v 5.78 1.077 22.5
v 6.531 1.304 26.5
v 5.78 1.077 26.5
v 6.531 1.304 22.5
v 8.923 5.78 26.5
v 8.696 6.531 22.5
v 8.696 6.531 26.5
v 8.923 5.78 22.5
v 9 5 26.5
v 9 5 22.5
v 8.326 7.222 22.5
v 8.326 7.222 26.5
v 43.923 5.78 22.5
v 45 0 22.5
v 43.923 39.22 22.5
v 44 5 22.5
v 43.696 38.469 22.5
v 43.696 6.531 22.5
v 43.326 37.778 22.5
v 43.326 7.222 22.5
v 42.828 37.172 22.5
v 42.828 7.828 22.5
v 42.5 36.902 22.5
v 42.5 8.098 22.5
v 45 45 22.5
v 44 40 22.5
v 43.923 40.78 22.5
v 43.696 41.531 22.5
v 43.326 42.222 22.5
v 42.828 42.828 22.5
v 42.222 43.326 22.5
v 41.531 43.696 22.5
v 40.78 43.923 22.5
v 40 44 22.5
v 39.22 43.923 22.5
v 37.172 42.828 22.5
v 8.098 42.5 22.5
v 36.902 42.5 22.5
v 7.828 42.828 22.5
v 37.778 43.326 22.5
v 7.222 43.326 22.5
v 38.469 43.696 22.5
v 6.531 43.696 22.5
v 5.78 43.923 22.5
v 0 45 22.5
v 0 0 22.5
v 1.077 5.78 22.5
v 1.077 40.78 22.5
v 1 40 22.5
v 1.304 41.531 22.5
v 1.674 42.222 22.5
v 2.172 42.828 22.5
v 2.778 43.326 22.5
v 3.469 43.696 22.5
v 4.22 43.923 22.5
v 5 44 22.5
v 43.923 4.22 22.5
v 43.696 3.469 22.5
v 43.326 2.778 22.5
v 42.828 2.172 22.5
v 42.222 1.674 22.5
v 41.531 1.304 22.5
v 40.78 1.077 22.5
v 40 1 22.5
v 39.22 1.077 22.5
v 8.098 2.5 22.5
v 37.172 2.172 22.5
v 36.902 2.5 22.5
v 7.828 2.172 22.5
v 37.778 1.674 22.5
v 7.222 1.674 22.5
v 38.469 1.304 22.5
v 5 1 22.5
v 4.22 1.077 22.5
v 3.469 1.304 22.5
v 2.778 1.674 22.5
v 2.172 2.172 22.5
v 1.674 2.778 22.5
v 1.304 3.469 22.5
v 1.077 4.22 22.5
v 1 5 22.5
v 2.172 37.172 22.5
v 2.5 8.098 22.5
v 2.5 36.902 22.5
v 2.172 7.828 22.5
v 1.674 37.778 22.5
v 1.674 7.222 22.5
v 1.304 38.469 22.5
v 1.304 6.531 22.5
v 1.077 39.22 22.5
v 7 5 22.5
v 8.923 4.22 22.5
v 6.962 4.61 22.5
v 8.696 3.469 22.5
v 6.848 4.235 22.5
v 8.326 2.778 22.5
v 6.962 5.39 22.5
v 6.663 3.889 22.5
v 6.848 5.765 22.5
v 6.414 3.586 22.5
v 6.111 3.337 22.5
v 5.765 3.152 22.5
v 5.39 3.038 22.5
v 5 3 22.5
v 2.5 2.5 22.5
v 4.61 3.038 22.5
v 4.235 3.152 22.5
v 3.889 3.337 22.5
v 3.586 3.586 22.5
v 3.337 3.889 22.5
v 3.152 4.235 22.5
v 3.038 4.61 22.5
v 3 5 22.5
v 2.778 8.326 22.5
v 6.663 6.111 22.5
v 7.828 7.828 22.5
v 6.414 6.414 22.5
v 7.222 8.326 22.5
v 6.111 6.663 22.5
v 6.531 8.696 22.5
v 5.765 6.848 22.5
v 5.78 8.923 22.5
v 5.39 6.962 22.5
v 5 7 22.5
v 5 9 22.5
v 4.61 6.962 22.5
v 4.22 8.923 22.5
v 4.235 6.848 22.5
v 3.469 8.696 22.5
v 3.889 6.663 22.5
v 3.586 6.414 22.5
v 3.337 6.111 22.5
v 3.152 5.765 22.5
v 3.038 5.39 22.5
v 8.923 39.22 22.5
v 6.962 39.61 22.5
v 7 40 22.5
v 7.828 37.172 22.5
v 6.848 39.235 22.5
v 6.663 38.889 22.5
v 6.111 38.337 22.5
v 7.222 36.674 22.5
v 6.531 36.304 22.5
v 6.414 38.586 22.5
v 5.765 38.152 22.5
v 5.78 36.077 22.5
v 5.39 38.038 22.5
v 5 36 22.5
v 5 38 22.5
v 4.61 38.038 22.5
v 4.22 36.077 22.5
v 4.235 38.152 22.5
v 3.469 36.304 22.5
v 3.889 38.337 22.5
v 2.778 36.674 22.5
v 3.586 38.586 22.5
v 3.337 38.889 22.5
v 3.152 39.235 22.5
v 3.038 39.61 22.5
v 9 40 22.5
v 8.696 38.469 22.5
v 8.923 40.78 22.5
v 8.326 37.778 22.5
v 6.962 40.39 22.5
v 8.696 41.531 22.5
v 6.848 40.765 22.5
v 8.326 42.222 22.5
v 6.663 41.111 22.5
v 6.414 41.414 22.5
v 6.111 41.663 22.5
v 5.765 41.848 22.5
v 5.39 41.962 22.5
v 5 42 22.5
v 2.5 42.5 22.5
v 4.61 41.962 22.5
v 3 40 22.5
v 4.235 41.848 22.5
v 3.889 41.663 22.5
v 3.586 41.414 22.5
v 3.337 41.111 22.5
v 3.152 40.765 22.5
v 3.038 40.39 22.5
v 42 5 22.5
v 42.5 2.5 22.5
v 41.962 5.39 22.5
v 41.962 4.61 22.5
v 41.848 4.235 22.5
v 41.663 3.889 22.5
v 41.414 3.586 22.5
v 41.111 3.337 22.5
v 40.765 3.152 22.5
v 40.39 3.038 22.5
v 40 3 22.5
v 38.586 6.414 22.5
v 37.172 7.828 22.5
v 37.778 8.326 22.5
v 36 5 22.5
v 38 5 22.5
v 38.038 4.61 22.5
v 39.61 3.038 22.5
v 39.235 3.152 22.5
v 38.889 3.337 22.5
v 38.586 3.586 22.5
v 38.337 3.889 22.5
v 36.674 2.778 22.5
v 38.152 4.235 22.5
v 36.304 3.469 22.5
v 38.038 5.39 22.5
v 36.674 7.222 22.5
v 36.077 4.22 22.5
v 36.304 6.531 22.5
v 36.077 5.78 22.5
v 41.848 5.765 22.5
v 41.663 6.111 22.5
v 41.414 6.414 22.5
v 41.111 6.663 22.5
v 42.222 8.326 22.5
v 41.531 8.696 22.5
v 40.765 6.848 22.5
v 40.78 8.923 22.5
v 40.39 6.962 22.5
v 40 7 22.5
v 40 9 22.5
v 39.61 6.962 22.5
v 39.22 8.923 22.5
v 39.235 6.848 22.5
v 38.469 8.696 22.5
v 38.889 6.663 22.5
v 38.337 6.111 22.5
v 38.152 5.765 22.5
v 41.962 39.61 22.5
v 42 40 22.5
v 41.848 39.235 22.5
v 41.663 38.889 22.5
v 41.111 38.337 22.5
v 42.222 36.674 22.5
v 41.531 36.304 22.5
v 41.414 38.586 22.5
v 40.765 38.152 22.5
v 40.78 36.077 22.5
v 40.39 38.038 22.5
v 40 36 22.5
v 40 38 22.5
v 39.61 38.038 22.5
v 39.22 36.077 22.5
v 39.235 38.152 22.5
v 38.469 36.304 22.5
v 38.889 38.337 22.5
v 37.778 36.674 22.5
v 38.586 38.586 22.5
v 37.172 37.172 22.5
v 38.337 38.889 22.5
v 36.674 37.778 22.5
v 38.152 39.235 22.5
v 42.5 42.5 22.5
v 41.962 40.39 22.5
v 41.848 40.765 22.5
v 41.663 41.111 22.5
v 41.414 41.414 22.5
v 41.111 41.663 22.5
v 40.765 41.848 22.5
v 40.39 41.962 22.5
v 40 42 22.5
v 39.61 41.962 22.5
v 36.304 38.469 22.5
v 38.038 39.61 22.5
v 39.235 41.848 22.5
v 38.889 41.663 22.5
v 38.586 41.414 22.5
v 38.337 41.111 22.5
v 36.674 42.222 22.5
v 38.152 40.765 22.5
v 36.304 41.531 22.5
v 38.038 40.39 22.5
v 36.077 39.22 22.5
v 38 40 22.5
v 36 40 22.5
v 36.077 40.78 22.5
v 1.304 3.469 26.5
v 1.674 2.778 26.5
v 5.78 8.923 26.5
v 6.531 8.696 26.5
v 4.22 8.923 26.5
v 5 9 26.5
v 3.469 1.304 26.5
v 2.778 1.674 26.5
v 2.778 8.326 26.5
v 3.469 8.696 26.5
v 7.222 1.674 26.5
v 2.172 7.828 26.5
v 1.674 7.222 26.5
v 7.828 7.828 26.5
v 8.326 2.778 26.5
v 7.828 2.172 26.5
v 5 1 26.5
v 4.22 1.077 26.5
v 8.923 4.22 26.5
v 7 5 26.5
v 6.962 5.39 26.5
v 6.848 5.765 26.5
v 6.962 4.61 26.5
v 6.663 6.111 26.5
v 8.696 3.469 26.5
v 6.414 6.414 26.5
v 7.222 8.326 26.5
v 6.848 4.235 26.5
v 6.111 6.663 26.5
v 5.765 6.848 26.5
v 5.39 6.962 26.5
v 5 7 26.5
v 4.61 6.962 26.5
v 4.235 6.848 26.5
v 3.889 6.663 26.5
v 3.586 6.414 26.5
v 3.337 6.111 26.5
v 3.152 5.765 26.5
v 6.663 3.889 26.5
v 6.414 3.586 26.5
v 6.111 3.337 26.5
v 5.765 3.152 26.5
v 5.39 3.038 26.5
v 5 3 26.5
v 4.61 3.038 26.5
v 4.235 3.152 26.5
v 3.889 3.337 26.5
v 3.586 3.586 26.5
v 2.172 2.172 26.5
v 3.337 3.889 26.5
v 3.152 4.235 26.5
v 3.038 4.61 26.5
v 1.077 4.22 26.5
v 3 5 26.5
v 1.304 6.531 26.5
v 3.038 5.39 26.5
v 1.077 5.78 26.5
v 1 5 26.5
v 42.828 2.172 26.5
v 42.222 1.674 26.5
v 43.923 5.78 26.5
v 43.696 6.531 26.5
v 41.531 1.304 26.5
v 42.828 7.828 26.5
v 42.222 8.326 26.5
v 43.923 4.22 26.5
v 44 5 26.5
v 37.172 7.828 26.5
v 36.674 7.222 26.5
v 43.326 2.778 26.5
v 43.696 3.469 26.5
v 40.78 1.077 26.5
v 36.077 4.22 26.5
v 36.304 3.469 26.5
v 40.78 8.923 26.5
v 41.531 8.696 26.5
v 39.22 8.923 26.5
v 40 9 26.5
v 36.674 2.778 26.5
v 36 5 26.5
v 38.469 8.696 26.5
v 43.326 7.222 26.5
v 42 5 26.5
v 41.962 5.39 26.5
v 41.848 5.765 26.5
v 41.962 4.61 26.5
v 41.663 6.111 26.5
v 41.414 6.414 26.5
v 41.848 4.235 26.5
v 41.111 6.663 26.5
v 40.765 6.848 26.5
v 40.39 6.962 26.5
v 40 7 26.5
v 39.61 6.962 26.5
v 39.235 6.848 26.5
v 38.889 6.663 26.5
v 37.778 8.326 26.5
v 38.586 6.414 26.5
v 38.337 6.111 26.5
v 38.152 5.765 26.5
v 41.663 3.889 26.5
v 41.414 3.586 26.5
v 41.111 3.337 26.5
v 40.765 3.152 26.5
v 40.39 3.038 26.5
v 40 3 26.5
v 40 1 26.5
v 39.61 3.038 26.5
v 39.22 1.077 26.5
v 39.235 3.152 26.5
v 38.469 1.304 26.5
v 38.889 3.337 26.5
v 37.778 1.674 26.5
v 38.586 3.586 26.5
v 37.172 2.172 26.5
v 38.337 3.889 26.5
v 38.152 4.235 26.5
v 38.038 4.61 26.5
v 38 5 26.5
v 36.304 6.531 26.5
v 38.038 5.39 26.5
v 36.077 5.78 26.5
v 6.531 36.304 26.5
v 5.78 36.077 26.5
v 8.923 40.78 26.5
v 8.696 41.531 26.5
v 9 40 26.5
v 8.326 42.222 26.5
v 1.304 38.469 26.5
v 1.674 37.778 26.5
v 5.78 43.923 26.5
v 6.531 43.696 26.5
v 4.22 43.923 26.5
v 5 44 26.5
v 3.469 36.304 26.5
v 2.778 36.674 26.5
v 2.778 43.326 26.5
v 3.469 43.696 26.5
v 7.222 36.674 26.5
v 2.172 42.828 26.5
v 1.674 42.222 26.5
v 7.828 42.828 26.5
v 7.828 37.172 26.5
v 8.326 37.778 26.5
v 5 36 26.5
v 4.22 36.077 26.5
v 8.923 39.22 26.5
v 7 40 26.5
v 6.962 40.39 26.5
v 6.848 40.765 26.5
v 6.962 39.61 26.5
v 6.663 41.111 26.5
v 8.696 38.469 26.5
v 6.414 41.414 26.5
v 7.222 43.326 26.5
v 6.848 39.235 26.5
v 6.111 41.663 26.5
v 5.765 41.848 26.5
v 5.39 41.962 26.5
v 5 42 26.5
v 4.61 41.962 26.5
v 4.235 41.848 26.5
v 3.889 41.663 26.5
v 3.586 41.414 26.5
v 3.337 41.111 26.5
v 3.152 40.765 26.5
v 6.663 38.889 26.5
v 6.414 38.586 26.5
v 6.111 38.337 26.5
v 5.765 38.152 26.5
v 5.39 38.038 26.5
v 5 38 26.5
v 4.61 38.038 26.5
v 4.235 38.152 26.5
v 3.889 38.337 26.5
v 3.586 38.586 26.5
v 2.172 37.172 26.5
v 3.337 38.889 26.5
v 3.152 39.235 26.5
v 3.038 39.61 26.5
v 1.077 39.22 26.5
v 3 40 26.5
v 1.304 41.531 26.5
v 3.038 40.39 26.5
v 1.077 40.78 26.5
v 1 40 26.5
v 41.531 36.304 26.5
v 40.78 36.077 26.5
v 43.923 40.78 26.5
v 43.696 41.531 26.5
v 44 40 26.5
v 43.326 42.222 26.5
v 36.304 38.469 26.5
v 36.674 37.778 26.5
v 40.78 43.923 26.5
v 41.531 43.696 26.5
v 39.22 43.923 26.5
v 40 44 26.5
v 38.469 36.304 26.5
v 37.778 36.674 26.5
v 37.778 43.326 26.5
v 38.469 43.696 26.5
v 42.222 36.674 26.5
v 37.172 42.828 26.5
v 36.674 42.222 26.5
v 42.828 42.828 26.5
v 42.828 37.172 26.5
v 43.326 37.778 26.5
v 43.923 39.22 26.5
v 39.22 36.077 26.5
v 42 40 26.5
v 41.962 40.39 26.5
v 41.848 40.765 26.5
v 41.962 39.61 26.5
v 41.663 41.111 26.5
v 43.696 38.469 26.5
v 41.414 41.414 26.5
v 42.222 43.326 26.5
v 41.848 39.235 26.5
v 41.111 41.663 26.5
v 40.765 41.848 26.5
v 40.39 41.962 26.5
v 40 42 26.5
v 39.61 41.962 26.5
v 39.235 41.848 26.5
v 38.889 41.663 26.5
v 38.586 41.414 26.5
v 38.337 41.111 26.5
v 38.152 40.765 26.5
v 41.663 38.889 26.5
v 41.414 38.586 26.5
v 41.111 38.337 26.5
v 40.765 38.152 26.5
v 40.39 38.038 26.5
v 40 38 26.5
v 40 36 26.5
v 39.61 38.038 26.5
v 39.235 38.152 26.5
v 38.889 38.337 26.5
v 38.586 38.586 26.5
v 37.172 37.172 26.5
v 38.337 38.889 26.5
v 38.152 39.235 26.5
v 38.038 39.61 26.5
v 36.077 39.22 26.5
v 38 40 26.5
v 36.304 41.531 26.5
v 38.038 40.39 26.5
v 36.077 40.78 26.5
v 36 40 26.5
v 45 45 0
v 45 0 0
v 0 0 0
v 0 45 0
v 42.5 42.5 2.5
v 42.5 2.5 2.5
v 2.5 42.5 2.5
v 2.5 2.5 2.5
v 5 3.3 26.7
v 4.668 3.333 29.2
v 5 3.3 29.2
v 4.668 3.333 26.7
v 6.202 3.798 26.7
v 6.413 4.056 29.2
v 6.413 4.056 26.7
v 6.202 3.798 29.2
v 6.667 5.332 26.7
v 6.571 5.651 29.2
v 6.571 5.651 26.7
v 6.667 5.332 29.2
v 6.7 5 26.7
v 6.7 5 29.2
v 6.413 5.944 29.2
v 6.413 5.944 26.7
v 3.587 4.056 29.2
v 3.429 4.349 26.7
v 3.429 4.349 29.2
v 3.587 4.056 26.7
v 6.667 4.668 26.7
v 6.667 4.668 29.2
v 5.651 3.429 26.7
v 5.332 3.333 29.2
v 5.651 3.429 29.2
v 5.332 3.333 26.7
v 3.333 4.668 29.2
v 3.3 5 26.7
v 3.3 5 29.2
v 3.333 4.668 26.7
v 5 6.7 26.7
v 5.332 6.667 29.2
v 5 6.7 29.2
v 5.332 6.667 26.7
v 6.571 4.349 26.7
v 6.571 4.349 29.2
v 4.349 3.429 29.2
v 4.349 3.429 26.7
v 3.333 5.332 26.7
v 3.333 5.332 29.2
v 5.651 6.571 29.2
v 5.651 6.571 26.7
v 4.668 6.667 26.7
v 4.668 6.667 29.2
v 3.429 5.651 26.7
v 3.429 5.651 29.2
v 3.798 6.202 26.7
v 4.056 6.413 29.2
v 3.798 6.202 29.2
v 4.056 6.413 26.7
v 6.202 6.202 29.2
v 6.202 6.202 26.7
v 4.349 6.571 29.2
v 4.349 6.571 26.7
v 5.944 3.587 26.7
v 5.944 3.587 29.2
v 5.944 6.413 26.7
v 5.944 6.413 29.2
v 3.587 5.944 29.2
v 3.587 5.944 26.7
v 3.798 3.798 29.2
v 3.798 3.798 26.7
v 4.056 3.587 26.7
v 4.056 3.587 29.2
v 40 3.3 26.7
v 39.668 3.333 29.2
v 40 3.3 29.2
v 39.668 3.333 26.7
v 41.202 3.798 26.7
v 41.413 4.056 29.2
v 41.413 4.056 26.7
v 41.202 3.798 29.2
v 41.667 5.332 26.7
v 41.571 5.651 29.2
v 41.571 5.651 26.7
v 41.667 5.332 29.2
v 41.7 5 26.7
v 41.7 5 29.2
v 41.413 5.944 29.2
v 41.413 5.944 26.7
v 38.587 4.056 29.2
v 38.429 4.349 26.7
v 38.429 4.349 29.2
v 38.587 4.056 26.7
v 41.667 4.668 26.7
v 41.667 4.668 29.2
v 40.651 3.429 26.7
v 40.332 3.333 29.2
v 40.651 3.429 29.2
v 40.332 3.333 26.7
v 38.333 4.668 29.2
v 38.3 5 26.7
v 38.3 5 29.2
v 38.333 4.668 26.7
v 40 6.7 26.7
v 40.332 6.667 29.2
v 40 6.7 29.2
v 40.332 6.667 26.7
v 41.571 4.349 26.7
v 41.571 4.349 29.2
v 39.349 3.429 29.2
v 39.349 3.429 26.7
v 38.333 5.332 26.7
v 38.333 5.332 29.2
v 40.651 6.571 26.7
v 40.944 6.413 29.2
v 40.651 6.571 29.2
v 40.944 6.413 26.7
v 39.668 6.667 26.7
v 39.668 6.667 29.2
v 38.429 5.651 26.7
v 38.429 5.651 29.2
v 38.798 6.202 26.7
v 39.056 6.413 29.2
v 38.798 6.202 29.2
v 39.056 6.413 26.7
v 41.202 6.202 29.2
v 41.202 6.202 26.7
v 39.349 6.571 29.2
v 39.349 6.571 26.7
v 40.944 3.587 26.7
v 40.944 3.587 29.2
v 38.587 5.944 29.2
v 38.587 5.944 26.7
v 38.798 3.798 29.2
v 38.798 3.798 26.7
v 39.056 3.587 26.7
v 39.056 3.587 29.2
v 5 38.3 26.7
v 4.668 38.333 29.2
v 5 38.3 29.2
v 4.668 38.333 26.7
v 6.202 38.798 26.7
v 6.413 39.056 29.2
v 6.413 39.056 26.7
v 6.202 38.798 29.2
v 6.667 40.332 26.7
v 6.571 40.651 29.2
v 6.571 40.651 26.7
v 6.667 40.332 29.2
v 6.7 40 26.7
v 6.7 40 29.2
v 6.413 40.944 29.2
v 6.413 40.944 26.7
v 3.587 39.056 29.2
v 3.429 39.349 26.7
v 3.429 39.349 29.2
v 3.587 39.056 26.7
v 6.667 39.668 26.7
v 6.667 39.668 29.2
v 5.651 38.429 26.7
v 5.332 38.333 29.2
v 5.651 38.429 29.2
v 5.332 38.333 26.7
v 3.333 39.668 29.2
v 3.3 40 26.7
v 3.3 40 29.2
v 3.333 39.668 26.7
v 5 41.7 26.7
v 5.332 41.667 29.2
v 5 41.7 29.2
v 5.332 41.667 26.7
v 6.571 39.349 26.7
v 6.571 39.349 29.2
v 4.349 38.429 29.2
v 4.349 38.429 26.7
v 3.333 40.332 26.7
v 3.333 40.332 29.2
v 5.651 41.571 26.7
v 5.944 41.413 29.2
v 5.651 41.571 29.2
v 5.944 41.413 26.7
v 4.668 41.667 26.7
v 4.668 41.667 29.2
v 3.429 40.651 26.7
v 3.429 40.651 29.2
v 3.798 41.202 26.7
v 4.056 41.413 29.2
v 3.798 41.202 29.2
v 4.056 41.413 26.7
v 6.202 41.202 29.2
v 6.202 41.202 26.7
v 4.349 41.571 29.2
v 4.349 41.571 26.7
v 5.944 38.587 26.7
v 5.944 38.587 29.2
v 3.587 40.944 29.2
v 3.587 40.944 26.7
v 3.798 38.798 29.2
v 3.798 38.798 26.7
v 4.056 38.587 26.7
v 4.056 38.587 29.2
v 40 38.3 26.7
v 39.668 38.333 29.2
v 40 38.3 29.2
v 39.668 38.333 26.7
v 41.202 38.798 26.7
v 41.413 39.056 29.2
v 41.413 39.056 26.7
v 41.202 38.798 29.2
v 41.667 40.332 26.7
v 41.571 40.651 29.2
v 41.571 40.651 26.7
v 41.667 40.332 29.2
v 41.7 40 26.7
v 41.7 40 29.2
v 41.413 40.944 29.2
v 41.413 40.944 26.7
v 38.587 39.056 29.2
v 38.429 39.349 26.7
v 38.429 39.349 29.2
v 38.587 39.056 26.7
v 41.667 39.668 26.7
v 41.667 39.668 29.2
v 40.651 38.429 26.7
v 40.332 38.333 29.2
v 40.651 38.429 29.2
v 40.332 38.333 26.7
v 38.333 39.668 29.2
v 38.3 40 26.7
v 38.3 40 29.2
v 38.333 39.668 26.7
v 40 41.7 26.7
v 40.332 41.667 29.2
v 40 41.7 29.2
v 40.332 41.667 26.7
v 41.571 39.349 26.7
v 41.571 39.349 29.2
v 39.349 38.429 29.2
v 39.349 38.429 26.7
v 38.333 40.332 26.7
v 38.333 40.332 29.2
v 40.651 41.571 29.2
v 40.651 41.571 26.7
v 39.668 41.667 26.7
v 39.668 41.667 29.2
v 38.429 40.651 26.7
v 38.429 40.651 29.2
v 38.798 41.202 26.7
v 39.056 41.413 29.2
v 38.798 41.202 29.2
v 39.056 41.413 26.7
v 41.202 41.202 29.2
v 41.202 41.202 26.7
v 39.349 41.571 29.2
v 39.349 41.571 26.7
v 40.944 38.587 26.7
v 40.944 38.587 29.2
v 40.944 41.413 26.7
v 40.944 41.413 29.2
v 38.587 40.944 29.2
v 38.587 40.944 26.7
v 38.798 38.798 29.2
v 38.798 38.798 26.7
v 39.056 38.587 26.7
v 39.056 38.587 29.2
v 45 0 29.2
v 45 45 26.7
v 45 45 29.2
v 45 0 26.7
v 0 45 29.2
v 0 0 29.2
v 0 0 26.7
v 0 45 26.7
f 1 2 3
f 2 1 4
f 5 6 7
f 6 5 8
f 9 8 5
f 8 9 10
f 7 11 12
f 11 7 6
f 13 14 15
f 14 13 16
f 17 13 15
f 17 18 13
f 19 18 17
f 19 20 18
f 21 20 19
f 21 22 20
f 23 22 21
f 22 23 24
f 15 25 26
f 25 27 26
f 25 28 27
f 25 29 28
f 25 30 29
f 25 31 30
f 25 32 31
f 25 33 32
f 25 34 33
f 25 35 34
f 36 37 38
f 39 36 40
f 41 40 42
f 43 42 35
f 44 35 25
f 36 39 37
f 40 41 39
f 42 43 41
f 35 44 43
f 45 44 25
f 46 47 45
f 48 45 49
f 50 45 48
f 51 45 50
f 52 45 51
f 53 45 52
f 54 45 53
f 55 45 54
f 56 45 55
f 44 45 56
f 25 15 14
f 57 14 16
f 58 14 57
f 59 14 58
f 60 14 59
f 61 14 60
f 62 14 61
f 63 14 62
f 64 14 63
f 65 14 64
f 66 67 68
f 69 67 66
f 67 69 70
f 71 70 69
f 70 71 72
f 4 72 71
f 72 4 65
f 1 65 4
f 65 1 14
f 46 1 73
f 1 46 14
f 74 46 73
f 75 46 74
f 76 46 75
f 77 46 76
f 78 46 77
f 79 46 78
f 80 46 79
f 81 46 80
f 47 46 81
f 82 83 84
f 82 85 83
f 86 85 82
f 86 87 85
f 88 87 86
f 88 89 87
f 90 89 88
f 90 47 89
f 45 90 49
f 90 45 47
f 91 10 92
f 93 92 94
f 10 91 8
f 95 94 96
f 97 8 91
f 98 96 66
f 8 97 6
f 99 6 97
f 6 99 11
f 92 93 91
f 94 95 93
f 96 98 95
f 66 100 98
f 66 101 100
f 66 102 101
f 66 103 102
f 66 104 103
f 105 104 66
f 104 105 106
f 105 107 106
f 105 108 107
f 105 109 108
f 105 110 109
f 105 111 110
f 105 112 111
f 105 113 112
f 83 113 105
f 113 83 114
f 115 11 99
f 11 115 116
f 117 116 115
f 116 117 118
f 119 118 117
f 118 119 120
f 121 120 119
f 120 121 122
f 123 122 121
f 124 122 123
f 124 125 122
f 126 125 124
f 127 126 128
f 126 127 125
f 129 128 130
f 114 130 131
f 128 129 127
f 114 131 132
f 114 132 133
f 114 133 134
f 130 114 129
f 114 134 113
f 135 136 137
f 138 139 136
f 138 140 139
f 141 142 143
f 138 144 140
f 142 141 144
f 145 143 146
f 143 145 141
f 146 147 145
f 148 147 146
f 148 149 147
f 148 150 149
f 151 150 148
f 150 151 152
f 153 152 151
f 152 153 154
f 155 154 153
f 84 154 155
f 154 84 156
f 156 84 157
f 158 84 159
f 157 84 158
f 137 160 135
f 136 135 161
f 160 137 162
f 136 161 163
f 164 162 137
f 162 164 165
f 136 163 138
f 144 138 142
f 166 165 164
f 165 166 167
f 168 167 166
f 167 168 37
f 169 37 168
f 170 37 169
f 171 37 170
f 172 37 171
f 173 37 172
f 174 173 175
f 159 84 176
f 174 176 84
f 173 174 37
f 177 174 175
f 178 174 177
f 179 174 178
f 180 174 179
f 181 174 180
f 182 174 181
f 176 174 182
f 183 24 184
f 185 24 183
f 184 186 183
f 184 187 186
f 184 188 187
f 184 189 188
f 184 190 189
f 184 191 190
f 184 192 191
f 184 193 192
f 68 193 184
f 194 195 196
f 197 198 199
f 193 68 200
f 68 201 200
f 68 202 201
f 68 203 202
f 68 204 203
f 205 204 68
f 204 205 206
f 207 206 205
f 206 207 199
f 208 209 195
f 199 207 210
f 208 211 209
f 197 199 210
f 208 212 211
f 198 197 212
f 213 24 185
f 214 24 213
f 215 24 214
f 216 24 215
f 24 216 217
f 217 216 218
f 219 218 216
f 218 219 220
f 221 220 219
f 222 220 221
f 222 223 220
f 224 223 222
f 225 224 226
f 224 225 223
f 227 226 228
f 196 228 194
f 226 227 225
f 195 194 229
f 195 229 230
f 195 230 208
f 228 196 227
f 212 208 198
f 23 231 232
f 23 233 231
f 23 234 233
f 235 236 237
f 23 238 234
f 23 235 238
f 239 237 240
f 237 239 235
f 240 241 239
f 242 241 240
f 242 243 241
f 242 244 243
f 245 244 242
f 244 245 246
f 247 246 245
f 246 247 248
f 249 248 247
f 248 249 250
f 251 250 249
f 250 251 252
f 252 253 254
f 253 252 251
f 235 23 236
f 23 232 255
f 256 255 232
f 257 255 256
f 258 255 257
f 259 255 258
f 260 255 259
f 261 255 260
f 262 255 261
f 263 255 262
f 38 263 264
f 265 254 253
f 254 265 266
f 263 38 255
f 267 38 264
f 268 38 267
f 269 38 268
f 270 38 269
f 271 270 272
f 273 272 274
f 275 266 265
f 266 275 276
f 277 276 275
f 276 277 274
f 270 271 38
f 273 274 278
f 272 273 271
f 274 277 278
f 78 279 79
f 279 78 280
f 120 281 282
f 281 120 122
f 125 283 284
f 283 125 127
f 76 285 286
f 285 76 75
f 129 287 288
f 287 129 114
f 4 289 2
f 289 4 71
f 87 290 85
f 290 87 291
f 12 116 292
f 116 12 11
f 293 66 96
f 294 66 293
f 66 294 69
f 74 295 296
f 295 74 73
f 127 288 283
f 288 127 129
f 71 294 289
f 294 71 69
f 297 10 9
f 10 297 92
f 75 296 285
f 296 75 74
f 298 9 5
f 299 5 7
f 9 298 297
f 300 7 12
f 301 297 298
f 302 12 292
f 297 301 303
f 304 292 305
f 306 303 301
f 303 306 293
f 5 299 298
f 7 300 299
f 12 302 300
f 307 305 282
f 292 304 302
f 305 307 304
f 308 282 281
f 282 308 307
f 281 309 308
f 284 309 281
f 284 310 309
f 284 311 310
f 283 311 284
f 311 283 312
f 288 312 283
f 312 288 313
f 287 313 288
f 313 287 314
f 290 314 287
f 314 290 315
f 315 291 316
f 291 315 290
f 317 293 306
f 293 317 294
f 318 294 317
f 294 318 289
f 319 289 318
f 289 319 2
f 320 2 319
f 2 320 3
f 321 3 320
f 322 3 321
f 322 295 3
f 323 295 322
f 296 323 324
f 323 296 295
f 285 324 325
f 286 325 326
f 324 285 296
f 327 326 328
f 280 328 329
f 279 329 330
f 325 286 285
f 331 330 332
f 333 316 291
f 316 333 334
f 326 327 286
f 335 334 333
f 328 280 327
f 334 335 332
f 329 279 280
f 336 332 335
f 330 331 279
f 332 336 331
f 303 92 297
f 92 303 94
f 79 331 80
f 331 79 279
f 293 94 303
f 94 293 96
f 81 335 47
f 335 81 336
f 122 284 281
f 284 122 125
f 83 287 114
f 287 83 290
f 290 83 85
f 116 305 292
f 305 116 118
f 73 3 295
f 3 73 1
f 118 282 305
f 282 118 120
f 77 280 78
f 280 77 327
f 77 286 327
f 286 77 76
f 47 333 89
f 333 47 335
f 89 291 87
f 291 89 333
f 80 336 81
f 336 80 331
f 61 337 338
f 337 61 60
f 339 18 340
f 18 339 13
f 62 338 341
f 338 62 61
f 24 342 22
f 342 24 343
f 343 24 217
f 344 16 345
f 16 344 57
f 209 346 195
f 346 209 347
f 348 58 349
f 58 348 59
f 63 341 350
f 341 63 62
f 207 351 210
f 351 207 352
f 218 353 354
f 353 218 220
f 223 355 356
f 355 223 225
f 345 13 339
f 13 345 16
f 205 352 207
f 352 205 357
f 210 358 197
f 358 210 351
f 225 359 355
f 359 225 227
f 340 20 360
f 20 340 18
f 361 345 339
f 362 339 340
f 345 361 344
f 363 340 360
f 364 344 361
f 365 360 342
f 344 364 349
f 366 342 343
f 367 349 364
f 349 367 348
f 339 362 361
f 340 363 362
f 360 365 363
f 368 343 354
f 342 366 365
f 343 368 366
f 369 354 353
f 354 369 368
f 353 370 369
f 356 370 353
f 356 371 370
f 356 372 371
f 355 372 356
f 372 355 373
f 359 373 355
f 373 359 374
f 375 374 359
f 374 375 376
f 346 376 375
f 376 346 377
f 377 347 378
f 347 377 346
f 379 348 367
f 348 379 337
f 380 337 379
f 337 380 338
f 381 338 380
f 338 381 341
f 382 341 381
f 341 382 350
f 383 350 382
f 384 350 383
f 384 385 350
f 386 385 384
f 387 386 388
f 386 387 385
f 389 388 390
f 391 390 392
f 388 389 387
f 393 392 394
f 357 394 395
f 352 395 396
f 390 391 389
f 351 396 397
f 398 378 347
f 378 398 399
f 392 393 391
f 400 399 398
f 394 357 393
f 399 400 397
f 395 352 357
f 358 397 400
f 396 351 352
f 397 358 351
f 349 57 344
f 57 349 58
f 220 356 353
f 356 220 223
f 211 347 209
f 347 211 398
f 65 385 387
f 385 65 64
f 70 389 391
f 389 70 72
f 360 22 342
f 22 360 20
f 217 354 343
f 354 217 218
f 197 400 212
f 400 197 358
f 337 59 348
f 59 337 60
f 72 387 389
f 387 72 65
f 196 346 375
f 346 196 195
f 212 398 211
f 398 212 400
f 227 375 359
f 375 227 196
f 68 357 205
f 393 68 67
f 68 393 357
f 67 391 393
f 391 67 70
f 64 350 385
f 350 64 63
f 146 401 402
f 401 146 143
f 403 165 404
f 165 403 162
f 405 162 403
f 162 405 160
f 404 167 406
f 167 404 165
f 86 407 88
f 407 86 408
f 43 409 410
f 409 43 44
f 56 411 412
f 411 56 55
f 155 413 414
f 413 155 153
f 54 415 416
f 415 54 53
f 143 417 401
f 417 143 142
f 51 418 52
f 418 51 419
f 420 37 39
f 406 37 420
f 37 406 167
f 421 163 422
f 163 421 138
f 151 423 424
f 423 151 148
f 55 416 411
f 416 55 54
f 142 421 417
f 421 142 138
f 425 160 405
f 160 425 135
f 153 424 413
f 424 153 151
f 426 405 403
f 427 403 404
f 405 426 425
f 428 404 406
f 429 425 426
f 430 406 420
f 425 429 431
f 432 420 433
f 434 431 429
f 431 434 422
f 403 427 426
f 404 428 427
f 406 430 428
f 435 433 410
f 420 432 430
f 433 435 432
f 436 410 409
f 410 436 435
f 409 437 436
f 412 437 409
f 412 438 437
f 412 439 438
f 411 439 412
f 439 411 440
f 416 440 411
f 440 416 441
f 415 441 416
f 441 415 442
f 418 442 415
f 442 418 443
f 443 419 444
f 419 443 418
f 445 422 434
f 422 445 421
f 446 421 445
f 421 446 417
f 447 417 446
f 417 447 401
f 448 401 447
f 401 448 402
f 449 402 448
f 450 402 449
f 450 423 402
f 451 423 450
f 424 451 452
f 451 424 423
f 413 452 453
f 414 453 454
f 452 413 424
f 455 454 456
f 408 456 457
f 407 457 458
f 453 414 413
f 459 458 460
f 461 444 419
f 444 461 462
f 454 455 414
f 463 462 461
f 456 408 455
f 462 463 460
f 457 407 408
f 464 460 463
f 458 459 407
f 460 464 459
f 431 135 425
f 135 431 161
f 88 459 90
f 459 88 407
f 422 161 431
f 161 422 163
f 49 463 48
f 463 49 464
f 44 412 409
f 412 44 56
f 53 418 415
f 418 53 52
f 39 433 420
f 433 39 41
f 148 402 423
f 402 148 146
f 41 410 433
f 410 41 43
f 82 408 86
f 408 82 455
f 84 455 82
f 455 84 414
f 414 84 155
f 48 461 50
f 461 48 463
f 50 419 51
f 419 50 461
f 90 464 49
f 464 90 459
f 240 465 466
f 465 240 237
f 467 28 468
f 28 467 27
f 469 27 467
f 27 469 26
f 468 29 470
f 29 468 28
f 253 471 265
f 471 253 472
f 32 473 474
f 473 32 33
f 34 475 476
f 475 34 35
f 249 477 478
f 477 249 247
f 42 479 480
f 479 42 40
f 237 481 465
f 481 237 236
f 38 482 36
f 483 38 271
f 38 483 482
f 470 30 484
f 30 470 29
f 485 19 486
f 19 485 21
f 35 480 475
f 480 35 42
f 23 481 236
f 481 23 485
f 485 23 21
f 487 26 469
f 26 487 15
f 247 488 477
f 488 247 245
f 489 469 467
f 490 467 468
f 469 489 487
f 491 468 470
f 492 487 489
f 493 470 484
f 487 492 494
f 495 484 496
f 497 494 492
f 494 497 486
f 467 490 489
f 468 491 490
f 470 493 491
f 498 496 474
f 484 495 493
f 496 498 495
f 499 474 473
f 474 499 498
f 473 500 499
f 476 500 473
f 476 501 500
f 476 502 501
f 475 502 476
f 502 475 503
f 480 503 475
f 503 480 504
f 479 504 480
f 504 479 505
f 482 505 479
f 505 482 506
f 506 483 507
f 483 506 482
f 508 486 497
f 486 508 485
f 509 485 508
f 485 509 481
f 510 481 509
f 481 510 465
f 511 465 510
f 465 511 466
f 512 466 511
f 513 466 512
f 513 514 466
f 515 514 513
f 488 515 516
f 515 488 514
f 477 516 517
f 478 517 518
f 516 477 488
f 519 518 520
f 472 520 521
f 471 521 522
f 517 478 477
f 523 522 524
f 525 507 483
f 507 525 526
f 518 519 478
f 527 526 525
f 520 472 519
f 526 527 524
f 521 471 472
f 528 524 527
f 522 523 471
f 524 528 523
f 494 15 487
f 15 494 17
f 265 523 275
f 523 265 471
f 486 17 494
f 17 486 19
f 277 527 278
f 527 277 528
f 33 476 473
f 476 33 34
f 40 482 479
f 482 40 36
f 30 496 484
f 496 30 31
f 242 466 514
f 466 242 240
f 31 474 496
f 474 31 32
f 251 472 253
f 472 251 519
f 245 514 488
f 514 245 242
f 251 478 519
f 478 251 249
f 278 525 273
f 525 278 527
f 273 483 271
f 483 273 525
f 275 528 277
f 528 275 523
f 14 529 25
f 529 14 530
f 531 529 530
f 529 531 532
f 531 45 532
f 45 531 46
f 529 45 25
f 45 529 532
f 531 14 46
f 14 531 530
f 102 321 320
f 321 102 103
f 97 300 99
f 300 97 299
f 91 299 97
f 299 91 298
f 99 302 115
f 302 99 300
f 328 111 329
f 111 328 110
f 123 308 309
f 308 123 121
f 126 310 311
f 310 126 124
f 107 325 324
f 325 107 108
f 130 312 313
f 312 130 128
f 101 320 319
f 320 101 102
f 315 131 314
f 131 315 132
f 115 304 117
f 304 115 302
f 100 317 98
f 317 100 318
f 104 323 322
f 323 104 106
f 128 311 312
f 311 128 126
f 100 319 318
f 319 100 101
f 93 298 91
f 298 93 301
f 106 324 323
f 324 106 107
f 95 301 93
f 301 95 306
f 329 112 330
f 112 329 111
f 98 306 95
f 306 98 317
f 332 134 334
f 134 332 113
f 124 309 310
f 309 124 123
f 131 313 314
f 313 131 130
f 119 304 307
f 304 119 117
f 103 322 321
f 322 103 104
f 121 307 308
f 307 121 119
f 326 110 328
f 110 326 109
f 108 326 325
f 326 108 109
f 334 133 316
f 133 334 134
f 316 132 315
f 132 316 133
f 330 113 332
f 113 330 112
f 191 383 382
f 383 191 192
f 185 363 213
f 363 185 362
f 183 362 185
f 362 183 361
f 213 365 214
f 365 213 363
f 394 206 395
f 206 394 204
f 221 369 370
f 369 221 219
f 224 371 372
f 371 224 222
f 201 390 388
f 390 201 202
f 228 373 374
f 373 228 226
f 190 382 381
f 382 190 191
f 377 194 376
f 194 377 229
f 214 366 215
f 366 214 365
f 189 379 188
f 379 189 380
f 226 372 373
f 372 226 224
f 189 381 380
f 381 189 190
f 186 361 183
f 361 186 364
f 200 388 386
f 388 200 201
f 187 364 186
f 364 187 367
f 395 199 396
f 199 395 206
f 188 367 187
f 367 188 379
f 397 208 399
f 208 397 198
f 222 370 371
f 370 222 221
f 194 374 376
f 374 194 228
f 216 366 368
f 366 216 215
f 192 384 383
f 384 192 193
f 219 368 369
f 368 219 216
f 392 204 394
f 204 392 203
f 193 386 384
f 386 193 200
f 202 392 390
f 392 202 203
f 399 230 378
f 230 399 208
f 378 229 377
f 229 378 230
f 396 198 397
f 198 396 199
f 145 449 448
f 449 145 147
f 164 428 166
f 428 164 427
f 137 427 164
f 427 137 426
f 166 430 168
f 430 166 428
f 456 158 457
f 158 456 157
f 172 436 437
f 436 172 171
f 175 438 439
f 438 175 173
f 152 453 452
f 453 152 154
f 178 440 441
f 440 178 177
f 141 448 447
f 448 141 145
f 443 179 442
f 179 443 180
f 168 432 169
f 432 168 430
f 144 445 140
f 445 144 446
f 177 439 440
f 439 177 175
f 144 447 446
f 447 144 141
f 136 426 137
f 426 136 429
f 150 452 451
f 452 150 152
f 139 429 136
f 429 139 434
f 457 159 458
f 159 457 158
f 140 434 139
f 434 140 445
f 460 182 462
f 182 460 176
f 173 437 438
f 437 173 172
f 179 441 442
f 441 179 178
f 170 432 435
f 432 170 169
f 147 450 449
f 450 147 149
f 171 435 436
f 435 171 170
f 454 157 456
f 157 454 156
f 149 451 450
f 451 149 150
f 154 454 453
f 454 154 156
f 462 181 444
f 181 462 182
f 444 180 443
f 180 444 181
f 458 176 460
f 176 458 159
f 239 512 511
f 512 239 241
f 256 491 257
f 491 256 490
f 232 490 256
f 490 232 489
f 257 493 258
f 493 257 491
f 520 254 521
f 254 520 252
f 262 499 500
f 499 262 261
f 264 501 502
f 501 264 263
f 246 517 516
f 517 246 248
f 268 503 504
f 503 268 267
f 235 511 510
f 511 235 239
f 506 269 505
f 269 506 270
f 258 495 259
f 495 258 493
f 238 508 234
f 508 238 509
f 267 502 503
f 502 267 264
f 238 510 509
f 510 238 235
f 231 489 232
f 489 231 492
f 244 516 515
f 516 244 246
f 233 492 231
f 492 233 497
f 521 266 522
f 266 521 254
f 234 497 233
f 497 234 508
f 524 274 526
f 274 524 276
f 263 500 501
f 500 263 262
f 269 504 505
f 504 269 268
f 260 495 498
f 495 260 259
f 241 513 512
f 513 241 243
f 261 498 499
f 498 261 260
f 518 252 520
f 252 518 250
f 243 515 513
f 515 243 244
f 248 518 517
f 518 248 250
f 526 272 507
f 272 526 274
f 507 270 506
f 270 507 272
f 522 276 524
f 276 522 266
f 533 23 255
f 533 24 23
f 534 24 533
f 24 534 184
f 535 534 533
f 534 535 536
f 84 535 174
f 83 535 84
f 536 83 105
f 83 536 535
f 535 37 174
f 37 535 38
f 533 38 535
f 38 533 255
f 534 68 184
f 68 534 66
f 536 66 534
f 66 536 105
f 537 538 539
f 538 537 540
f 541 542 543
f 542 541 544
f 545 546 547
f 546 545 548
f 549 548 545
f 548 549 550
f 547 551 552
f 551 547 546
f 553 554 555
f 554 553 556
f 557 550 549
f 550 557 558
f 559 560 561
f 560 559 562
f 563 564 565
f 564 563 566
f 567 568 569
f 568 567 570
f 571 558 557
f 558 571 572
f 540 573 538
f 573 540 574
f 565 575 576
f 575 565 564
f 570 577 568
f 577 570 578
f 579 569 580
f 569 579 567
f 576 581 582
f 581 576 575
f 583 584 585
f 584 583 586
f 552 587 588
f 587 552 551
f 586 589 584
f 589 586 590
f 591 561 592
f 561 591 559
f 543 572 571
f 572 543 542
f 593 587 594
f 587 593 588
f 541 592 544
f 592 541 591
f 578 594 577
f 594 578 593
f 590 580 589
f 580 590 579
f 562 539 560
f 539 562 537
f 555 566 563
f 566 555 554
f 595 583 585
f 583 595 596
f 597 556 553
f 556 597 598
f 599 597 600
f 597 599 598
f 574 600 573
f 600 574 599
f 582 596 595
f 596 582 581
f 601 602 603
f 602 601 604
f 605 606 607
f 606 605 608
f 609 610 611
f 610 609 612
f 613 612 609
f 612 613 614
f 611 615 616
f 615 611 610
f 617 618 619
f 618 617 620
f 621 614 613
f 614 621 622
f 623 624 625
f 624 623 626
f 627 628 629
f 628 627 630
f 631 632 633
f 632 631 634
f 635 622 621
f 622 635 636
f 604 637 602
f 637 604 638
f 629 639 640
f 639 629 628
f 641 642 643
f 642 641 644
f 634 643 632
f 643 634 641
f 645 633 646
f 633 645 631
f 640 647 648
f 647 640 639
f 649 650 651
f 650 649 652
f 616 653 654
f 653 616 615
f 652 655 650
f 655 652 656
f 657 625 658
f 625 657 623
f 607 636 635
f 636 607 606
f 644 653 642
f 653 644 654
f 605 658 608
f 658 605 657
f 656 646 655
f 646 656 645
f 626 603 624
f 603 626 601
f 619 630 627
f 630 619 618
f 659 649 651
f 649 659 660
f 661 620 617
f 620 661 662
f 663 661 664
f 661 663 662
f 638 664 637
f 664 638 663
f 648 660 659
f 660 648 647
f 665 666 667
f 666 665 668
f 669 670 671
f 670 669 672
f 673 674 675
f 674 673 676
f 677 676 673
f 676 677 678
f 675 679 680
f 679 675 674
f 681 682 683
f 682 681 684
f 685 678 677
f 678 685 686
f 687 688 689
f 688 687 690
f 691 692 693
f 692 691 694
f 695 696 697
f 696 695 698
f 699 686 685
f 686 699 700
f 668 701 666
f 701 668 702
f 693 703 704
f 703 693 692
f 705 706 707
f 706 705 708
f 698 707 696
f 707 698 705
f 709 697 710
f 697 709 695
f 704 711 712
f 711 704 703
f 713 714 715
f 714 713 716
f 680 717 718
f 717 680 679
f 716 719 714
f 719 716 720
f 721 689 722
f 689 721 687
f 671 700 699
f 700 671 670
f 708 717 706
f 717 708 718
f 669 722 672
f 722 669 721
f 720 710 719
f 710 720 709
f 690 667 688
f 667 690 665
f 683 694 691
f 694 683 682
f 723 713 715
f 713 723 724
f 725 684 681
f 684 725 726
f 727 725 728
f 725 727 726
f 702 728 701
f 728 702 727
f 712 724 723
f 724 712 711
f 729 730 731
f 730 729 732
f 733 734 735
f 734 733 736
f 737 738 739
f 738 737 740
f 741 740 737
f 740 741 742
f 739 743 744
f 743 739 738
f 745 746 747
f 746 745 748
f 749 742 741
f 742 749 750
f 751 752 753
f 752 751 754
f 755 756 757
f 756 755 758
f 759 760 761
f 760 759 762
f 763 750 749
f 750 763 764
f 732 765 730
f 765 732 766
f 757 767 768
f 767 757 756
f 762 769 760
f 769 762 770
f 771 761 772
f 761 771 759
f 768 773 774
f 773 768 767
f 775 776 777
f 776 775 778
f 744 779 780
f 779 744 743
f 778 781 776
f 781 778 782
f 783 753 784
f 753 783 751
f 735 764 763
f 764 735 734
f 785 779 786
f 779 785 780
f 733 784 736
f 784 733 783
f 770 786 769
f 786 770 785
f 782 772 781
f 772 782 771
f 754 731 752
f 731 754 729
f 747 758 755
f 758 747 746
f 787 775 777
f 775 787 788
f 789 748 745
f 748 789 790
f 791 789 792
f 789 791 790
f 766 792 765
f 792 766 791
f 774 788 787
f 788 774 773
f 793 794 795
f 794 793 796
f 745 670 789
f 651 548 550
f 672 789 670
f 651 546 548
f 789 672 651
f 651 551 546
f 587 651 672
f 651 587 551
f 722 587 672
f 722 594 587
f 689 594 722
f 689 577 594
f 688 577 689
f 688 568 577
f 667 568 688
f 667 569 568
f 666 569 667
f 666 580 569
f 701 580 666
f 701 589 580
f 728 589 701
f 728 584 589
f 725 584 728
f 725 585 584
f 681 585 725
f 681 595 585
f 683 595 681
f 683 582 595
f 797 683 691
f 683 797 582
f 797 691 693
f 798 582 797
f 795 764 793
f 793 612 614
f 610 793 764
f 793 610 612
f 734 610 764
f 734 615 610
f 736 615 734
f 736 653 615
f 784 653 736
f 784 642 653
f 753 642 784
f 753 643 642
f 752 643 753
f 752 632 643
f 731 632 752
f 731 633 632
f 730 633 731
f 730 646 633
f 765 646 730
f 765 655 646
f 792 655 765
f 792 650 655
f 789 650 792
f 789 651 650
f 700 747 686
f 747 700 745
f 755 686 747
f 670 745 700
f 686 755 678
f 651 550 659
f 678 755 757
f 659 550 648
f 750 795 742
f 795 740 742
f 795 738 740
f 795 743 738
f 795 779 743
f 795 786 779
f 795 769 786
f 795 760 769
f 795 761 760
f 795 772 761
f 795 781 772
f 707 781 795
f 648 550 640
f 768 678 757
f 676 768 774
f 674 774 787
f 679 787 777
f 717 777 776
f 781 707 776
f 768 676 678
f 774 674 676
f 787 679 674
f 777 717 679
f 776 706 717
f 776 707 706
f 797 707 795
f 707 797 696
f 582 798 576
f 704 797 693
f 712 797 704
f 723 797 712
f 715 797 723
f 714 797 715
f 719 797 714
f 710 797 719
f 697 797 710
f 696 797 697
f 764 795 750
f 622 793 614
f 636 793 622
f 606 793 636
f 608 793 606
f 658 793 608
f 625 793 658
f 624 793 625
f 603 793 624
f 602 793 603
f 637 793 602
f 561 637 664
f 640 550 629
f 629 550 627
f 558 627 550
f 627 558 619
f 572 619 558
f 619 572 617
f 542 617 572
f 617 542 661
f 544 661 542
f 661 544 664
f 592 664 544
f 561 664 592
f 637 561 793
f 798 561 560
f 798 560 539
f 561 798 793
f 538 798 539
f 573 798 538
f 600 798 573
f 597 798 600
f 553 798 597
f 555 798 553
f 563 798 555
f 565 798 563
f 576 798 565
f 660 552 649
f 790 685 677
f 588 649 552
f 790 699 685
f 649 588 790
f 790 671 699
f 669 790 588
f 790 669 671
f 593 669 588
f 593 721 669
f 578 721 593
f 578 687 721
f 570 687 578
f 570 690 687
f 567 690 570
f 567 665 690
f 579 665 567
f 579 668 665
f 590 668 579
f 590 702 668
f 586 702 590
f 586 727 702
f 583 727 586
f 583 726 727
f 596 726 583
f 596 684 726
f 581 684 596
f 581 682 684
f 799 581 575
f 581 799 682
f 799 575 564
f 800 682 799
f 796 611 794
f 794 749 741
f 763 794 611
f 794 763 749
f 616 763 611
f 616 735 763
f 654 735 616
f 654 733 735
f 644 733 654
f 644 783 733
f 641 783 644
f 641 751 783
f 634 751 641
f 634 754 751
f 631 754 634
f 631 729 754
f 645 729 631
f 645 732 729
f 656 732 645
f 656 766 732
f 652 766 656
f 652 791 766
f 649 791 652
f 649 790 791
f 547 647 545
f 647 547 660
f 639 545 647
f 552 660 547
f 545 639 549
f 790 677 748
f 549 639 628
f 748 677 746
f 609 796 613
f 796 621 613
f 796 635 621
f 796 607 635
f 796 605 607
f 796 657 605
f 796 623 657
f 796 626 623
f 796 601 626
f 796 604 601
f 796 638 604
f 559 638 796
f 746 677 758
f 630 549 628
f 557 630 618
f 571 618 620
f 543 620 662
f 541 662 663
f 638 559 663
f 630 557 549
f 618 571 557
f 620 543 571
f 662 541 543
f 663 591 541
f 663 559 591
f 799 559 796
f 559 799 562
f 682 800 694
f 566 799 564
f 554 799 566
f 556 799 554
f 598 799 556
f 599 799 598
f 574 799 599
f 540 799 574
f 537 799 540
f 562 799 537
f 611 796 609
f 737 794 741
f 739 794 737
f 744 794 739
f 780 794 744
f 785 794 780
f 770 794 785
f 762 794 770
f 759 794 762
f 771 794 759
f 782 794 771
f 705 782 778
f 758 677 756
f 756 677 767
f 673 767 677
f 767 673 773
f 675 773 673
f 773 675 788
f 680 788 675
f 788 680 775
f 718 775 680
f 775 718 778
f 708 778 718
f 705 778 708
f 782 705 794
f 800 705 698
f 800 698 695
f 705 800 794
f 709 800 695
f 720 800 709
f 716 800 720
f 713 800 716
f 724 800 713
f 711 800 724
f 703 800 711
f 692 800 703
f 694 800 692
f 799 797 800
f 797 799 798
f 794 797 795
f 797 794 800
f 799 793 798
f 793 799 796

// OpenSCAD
// Two-Part Enclosure with M3 Heat-Set Inserts
// BOM:
// - MB-SHCS-M3-08 (4x): M3 Socket-Head Cap Screw, 8 mm length
// - MB-HSI-M3 (4x): M3 Heat-Set Insert, brass

wall_thickness = 2.5;
cavity_width = 40;
cavity_depth = 40;
cavity_height = 20;
ext_width = cavity_width + 2 * wall_thickness;
ext_depth = cavity_depth + 2 * wall_thickness;
base_height = wall_thickness + cavity_height;

insert_hole_dia = 4.0;
insert_boss_dia = 8.0;
insert_height = 4.0;
screw_clearance_hole = 3.4;

corner_inset = 5;
corners = [
    [corner_inset, corner_inset],
    [ext_width - corner_inset, corner_inset],
    [corner_inset, ext_depth - corner_inset],
    [ext_width - corner_inset, ext_depth - corner_inset]
];

// BASE
difference() {
    union() {
        cube([ext_width, ext_depth, base_height], center = false);
        for (pos = corners) {
            translate([pos[0], pos[1], base_height])
                cylinder(h = insert_height, d = insert_boss_dia, $fn = 32);
        }
    }
    translate([wall_thickness, wall_thickness, wall_thickness])
        cube([cavity_width, cavity_depth, cavity_height], center = false);
    for (pos = corners) {
        translate([pos[0], pos[1], base_height - 0.5])
            cylinder(h = insert_height + 1, d = insert_hole_dia, $fn = 32);
    }
}

// LID
translate([0, 0, base_height + insert_height + 0.2]) {
    difference() {
        cube([ext_width, ext_depth, wall_thickness], center = false);
        for (pos = corners) {
            translate([pos[0], pos[1], -0.5])
                cylinder(h = wall_thickness + 1, d = screw_clearance_hole, $fn = 32);
        }
    }
}
